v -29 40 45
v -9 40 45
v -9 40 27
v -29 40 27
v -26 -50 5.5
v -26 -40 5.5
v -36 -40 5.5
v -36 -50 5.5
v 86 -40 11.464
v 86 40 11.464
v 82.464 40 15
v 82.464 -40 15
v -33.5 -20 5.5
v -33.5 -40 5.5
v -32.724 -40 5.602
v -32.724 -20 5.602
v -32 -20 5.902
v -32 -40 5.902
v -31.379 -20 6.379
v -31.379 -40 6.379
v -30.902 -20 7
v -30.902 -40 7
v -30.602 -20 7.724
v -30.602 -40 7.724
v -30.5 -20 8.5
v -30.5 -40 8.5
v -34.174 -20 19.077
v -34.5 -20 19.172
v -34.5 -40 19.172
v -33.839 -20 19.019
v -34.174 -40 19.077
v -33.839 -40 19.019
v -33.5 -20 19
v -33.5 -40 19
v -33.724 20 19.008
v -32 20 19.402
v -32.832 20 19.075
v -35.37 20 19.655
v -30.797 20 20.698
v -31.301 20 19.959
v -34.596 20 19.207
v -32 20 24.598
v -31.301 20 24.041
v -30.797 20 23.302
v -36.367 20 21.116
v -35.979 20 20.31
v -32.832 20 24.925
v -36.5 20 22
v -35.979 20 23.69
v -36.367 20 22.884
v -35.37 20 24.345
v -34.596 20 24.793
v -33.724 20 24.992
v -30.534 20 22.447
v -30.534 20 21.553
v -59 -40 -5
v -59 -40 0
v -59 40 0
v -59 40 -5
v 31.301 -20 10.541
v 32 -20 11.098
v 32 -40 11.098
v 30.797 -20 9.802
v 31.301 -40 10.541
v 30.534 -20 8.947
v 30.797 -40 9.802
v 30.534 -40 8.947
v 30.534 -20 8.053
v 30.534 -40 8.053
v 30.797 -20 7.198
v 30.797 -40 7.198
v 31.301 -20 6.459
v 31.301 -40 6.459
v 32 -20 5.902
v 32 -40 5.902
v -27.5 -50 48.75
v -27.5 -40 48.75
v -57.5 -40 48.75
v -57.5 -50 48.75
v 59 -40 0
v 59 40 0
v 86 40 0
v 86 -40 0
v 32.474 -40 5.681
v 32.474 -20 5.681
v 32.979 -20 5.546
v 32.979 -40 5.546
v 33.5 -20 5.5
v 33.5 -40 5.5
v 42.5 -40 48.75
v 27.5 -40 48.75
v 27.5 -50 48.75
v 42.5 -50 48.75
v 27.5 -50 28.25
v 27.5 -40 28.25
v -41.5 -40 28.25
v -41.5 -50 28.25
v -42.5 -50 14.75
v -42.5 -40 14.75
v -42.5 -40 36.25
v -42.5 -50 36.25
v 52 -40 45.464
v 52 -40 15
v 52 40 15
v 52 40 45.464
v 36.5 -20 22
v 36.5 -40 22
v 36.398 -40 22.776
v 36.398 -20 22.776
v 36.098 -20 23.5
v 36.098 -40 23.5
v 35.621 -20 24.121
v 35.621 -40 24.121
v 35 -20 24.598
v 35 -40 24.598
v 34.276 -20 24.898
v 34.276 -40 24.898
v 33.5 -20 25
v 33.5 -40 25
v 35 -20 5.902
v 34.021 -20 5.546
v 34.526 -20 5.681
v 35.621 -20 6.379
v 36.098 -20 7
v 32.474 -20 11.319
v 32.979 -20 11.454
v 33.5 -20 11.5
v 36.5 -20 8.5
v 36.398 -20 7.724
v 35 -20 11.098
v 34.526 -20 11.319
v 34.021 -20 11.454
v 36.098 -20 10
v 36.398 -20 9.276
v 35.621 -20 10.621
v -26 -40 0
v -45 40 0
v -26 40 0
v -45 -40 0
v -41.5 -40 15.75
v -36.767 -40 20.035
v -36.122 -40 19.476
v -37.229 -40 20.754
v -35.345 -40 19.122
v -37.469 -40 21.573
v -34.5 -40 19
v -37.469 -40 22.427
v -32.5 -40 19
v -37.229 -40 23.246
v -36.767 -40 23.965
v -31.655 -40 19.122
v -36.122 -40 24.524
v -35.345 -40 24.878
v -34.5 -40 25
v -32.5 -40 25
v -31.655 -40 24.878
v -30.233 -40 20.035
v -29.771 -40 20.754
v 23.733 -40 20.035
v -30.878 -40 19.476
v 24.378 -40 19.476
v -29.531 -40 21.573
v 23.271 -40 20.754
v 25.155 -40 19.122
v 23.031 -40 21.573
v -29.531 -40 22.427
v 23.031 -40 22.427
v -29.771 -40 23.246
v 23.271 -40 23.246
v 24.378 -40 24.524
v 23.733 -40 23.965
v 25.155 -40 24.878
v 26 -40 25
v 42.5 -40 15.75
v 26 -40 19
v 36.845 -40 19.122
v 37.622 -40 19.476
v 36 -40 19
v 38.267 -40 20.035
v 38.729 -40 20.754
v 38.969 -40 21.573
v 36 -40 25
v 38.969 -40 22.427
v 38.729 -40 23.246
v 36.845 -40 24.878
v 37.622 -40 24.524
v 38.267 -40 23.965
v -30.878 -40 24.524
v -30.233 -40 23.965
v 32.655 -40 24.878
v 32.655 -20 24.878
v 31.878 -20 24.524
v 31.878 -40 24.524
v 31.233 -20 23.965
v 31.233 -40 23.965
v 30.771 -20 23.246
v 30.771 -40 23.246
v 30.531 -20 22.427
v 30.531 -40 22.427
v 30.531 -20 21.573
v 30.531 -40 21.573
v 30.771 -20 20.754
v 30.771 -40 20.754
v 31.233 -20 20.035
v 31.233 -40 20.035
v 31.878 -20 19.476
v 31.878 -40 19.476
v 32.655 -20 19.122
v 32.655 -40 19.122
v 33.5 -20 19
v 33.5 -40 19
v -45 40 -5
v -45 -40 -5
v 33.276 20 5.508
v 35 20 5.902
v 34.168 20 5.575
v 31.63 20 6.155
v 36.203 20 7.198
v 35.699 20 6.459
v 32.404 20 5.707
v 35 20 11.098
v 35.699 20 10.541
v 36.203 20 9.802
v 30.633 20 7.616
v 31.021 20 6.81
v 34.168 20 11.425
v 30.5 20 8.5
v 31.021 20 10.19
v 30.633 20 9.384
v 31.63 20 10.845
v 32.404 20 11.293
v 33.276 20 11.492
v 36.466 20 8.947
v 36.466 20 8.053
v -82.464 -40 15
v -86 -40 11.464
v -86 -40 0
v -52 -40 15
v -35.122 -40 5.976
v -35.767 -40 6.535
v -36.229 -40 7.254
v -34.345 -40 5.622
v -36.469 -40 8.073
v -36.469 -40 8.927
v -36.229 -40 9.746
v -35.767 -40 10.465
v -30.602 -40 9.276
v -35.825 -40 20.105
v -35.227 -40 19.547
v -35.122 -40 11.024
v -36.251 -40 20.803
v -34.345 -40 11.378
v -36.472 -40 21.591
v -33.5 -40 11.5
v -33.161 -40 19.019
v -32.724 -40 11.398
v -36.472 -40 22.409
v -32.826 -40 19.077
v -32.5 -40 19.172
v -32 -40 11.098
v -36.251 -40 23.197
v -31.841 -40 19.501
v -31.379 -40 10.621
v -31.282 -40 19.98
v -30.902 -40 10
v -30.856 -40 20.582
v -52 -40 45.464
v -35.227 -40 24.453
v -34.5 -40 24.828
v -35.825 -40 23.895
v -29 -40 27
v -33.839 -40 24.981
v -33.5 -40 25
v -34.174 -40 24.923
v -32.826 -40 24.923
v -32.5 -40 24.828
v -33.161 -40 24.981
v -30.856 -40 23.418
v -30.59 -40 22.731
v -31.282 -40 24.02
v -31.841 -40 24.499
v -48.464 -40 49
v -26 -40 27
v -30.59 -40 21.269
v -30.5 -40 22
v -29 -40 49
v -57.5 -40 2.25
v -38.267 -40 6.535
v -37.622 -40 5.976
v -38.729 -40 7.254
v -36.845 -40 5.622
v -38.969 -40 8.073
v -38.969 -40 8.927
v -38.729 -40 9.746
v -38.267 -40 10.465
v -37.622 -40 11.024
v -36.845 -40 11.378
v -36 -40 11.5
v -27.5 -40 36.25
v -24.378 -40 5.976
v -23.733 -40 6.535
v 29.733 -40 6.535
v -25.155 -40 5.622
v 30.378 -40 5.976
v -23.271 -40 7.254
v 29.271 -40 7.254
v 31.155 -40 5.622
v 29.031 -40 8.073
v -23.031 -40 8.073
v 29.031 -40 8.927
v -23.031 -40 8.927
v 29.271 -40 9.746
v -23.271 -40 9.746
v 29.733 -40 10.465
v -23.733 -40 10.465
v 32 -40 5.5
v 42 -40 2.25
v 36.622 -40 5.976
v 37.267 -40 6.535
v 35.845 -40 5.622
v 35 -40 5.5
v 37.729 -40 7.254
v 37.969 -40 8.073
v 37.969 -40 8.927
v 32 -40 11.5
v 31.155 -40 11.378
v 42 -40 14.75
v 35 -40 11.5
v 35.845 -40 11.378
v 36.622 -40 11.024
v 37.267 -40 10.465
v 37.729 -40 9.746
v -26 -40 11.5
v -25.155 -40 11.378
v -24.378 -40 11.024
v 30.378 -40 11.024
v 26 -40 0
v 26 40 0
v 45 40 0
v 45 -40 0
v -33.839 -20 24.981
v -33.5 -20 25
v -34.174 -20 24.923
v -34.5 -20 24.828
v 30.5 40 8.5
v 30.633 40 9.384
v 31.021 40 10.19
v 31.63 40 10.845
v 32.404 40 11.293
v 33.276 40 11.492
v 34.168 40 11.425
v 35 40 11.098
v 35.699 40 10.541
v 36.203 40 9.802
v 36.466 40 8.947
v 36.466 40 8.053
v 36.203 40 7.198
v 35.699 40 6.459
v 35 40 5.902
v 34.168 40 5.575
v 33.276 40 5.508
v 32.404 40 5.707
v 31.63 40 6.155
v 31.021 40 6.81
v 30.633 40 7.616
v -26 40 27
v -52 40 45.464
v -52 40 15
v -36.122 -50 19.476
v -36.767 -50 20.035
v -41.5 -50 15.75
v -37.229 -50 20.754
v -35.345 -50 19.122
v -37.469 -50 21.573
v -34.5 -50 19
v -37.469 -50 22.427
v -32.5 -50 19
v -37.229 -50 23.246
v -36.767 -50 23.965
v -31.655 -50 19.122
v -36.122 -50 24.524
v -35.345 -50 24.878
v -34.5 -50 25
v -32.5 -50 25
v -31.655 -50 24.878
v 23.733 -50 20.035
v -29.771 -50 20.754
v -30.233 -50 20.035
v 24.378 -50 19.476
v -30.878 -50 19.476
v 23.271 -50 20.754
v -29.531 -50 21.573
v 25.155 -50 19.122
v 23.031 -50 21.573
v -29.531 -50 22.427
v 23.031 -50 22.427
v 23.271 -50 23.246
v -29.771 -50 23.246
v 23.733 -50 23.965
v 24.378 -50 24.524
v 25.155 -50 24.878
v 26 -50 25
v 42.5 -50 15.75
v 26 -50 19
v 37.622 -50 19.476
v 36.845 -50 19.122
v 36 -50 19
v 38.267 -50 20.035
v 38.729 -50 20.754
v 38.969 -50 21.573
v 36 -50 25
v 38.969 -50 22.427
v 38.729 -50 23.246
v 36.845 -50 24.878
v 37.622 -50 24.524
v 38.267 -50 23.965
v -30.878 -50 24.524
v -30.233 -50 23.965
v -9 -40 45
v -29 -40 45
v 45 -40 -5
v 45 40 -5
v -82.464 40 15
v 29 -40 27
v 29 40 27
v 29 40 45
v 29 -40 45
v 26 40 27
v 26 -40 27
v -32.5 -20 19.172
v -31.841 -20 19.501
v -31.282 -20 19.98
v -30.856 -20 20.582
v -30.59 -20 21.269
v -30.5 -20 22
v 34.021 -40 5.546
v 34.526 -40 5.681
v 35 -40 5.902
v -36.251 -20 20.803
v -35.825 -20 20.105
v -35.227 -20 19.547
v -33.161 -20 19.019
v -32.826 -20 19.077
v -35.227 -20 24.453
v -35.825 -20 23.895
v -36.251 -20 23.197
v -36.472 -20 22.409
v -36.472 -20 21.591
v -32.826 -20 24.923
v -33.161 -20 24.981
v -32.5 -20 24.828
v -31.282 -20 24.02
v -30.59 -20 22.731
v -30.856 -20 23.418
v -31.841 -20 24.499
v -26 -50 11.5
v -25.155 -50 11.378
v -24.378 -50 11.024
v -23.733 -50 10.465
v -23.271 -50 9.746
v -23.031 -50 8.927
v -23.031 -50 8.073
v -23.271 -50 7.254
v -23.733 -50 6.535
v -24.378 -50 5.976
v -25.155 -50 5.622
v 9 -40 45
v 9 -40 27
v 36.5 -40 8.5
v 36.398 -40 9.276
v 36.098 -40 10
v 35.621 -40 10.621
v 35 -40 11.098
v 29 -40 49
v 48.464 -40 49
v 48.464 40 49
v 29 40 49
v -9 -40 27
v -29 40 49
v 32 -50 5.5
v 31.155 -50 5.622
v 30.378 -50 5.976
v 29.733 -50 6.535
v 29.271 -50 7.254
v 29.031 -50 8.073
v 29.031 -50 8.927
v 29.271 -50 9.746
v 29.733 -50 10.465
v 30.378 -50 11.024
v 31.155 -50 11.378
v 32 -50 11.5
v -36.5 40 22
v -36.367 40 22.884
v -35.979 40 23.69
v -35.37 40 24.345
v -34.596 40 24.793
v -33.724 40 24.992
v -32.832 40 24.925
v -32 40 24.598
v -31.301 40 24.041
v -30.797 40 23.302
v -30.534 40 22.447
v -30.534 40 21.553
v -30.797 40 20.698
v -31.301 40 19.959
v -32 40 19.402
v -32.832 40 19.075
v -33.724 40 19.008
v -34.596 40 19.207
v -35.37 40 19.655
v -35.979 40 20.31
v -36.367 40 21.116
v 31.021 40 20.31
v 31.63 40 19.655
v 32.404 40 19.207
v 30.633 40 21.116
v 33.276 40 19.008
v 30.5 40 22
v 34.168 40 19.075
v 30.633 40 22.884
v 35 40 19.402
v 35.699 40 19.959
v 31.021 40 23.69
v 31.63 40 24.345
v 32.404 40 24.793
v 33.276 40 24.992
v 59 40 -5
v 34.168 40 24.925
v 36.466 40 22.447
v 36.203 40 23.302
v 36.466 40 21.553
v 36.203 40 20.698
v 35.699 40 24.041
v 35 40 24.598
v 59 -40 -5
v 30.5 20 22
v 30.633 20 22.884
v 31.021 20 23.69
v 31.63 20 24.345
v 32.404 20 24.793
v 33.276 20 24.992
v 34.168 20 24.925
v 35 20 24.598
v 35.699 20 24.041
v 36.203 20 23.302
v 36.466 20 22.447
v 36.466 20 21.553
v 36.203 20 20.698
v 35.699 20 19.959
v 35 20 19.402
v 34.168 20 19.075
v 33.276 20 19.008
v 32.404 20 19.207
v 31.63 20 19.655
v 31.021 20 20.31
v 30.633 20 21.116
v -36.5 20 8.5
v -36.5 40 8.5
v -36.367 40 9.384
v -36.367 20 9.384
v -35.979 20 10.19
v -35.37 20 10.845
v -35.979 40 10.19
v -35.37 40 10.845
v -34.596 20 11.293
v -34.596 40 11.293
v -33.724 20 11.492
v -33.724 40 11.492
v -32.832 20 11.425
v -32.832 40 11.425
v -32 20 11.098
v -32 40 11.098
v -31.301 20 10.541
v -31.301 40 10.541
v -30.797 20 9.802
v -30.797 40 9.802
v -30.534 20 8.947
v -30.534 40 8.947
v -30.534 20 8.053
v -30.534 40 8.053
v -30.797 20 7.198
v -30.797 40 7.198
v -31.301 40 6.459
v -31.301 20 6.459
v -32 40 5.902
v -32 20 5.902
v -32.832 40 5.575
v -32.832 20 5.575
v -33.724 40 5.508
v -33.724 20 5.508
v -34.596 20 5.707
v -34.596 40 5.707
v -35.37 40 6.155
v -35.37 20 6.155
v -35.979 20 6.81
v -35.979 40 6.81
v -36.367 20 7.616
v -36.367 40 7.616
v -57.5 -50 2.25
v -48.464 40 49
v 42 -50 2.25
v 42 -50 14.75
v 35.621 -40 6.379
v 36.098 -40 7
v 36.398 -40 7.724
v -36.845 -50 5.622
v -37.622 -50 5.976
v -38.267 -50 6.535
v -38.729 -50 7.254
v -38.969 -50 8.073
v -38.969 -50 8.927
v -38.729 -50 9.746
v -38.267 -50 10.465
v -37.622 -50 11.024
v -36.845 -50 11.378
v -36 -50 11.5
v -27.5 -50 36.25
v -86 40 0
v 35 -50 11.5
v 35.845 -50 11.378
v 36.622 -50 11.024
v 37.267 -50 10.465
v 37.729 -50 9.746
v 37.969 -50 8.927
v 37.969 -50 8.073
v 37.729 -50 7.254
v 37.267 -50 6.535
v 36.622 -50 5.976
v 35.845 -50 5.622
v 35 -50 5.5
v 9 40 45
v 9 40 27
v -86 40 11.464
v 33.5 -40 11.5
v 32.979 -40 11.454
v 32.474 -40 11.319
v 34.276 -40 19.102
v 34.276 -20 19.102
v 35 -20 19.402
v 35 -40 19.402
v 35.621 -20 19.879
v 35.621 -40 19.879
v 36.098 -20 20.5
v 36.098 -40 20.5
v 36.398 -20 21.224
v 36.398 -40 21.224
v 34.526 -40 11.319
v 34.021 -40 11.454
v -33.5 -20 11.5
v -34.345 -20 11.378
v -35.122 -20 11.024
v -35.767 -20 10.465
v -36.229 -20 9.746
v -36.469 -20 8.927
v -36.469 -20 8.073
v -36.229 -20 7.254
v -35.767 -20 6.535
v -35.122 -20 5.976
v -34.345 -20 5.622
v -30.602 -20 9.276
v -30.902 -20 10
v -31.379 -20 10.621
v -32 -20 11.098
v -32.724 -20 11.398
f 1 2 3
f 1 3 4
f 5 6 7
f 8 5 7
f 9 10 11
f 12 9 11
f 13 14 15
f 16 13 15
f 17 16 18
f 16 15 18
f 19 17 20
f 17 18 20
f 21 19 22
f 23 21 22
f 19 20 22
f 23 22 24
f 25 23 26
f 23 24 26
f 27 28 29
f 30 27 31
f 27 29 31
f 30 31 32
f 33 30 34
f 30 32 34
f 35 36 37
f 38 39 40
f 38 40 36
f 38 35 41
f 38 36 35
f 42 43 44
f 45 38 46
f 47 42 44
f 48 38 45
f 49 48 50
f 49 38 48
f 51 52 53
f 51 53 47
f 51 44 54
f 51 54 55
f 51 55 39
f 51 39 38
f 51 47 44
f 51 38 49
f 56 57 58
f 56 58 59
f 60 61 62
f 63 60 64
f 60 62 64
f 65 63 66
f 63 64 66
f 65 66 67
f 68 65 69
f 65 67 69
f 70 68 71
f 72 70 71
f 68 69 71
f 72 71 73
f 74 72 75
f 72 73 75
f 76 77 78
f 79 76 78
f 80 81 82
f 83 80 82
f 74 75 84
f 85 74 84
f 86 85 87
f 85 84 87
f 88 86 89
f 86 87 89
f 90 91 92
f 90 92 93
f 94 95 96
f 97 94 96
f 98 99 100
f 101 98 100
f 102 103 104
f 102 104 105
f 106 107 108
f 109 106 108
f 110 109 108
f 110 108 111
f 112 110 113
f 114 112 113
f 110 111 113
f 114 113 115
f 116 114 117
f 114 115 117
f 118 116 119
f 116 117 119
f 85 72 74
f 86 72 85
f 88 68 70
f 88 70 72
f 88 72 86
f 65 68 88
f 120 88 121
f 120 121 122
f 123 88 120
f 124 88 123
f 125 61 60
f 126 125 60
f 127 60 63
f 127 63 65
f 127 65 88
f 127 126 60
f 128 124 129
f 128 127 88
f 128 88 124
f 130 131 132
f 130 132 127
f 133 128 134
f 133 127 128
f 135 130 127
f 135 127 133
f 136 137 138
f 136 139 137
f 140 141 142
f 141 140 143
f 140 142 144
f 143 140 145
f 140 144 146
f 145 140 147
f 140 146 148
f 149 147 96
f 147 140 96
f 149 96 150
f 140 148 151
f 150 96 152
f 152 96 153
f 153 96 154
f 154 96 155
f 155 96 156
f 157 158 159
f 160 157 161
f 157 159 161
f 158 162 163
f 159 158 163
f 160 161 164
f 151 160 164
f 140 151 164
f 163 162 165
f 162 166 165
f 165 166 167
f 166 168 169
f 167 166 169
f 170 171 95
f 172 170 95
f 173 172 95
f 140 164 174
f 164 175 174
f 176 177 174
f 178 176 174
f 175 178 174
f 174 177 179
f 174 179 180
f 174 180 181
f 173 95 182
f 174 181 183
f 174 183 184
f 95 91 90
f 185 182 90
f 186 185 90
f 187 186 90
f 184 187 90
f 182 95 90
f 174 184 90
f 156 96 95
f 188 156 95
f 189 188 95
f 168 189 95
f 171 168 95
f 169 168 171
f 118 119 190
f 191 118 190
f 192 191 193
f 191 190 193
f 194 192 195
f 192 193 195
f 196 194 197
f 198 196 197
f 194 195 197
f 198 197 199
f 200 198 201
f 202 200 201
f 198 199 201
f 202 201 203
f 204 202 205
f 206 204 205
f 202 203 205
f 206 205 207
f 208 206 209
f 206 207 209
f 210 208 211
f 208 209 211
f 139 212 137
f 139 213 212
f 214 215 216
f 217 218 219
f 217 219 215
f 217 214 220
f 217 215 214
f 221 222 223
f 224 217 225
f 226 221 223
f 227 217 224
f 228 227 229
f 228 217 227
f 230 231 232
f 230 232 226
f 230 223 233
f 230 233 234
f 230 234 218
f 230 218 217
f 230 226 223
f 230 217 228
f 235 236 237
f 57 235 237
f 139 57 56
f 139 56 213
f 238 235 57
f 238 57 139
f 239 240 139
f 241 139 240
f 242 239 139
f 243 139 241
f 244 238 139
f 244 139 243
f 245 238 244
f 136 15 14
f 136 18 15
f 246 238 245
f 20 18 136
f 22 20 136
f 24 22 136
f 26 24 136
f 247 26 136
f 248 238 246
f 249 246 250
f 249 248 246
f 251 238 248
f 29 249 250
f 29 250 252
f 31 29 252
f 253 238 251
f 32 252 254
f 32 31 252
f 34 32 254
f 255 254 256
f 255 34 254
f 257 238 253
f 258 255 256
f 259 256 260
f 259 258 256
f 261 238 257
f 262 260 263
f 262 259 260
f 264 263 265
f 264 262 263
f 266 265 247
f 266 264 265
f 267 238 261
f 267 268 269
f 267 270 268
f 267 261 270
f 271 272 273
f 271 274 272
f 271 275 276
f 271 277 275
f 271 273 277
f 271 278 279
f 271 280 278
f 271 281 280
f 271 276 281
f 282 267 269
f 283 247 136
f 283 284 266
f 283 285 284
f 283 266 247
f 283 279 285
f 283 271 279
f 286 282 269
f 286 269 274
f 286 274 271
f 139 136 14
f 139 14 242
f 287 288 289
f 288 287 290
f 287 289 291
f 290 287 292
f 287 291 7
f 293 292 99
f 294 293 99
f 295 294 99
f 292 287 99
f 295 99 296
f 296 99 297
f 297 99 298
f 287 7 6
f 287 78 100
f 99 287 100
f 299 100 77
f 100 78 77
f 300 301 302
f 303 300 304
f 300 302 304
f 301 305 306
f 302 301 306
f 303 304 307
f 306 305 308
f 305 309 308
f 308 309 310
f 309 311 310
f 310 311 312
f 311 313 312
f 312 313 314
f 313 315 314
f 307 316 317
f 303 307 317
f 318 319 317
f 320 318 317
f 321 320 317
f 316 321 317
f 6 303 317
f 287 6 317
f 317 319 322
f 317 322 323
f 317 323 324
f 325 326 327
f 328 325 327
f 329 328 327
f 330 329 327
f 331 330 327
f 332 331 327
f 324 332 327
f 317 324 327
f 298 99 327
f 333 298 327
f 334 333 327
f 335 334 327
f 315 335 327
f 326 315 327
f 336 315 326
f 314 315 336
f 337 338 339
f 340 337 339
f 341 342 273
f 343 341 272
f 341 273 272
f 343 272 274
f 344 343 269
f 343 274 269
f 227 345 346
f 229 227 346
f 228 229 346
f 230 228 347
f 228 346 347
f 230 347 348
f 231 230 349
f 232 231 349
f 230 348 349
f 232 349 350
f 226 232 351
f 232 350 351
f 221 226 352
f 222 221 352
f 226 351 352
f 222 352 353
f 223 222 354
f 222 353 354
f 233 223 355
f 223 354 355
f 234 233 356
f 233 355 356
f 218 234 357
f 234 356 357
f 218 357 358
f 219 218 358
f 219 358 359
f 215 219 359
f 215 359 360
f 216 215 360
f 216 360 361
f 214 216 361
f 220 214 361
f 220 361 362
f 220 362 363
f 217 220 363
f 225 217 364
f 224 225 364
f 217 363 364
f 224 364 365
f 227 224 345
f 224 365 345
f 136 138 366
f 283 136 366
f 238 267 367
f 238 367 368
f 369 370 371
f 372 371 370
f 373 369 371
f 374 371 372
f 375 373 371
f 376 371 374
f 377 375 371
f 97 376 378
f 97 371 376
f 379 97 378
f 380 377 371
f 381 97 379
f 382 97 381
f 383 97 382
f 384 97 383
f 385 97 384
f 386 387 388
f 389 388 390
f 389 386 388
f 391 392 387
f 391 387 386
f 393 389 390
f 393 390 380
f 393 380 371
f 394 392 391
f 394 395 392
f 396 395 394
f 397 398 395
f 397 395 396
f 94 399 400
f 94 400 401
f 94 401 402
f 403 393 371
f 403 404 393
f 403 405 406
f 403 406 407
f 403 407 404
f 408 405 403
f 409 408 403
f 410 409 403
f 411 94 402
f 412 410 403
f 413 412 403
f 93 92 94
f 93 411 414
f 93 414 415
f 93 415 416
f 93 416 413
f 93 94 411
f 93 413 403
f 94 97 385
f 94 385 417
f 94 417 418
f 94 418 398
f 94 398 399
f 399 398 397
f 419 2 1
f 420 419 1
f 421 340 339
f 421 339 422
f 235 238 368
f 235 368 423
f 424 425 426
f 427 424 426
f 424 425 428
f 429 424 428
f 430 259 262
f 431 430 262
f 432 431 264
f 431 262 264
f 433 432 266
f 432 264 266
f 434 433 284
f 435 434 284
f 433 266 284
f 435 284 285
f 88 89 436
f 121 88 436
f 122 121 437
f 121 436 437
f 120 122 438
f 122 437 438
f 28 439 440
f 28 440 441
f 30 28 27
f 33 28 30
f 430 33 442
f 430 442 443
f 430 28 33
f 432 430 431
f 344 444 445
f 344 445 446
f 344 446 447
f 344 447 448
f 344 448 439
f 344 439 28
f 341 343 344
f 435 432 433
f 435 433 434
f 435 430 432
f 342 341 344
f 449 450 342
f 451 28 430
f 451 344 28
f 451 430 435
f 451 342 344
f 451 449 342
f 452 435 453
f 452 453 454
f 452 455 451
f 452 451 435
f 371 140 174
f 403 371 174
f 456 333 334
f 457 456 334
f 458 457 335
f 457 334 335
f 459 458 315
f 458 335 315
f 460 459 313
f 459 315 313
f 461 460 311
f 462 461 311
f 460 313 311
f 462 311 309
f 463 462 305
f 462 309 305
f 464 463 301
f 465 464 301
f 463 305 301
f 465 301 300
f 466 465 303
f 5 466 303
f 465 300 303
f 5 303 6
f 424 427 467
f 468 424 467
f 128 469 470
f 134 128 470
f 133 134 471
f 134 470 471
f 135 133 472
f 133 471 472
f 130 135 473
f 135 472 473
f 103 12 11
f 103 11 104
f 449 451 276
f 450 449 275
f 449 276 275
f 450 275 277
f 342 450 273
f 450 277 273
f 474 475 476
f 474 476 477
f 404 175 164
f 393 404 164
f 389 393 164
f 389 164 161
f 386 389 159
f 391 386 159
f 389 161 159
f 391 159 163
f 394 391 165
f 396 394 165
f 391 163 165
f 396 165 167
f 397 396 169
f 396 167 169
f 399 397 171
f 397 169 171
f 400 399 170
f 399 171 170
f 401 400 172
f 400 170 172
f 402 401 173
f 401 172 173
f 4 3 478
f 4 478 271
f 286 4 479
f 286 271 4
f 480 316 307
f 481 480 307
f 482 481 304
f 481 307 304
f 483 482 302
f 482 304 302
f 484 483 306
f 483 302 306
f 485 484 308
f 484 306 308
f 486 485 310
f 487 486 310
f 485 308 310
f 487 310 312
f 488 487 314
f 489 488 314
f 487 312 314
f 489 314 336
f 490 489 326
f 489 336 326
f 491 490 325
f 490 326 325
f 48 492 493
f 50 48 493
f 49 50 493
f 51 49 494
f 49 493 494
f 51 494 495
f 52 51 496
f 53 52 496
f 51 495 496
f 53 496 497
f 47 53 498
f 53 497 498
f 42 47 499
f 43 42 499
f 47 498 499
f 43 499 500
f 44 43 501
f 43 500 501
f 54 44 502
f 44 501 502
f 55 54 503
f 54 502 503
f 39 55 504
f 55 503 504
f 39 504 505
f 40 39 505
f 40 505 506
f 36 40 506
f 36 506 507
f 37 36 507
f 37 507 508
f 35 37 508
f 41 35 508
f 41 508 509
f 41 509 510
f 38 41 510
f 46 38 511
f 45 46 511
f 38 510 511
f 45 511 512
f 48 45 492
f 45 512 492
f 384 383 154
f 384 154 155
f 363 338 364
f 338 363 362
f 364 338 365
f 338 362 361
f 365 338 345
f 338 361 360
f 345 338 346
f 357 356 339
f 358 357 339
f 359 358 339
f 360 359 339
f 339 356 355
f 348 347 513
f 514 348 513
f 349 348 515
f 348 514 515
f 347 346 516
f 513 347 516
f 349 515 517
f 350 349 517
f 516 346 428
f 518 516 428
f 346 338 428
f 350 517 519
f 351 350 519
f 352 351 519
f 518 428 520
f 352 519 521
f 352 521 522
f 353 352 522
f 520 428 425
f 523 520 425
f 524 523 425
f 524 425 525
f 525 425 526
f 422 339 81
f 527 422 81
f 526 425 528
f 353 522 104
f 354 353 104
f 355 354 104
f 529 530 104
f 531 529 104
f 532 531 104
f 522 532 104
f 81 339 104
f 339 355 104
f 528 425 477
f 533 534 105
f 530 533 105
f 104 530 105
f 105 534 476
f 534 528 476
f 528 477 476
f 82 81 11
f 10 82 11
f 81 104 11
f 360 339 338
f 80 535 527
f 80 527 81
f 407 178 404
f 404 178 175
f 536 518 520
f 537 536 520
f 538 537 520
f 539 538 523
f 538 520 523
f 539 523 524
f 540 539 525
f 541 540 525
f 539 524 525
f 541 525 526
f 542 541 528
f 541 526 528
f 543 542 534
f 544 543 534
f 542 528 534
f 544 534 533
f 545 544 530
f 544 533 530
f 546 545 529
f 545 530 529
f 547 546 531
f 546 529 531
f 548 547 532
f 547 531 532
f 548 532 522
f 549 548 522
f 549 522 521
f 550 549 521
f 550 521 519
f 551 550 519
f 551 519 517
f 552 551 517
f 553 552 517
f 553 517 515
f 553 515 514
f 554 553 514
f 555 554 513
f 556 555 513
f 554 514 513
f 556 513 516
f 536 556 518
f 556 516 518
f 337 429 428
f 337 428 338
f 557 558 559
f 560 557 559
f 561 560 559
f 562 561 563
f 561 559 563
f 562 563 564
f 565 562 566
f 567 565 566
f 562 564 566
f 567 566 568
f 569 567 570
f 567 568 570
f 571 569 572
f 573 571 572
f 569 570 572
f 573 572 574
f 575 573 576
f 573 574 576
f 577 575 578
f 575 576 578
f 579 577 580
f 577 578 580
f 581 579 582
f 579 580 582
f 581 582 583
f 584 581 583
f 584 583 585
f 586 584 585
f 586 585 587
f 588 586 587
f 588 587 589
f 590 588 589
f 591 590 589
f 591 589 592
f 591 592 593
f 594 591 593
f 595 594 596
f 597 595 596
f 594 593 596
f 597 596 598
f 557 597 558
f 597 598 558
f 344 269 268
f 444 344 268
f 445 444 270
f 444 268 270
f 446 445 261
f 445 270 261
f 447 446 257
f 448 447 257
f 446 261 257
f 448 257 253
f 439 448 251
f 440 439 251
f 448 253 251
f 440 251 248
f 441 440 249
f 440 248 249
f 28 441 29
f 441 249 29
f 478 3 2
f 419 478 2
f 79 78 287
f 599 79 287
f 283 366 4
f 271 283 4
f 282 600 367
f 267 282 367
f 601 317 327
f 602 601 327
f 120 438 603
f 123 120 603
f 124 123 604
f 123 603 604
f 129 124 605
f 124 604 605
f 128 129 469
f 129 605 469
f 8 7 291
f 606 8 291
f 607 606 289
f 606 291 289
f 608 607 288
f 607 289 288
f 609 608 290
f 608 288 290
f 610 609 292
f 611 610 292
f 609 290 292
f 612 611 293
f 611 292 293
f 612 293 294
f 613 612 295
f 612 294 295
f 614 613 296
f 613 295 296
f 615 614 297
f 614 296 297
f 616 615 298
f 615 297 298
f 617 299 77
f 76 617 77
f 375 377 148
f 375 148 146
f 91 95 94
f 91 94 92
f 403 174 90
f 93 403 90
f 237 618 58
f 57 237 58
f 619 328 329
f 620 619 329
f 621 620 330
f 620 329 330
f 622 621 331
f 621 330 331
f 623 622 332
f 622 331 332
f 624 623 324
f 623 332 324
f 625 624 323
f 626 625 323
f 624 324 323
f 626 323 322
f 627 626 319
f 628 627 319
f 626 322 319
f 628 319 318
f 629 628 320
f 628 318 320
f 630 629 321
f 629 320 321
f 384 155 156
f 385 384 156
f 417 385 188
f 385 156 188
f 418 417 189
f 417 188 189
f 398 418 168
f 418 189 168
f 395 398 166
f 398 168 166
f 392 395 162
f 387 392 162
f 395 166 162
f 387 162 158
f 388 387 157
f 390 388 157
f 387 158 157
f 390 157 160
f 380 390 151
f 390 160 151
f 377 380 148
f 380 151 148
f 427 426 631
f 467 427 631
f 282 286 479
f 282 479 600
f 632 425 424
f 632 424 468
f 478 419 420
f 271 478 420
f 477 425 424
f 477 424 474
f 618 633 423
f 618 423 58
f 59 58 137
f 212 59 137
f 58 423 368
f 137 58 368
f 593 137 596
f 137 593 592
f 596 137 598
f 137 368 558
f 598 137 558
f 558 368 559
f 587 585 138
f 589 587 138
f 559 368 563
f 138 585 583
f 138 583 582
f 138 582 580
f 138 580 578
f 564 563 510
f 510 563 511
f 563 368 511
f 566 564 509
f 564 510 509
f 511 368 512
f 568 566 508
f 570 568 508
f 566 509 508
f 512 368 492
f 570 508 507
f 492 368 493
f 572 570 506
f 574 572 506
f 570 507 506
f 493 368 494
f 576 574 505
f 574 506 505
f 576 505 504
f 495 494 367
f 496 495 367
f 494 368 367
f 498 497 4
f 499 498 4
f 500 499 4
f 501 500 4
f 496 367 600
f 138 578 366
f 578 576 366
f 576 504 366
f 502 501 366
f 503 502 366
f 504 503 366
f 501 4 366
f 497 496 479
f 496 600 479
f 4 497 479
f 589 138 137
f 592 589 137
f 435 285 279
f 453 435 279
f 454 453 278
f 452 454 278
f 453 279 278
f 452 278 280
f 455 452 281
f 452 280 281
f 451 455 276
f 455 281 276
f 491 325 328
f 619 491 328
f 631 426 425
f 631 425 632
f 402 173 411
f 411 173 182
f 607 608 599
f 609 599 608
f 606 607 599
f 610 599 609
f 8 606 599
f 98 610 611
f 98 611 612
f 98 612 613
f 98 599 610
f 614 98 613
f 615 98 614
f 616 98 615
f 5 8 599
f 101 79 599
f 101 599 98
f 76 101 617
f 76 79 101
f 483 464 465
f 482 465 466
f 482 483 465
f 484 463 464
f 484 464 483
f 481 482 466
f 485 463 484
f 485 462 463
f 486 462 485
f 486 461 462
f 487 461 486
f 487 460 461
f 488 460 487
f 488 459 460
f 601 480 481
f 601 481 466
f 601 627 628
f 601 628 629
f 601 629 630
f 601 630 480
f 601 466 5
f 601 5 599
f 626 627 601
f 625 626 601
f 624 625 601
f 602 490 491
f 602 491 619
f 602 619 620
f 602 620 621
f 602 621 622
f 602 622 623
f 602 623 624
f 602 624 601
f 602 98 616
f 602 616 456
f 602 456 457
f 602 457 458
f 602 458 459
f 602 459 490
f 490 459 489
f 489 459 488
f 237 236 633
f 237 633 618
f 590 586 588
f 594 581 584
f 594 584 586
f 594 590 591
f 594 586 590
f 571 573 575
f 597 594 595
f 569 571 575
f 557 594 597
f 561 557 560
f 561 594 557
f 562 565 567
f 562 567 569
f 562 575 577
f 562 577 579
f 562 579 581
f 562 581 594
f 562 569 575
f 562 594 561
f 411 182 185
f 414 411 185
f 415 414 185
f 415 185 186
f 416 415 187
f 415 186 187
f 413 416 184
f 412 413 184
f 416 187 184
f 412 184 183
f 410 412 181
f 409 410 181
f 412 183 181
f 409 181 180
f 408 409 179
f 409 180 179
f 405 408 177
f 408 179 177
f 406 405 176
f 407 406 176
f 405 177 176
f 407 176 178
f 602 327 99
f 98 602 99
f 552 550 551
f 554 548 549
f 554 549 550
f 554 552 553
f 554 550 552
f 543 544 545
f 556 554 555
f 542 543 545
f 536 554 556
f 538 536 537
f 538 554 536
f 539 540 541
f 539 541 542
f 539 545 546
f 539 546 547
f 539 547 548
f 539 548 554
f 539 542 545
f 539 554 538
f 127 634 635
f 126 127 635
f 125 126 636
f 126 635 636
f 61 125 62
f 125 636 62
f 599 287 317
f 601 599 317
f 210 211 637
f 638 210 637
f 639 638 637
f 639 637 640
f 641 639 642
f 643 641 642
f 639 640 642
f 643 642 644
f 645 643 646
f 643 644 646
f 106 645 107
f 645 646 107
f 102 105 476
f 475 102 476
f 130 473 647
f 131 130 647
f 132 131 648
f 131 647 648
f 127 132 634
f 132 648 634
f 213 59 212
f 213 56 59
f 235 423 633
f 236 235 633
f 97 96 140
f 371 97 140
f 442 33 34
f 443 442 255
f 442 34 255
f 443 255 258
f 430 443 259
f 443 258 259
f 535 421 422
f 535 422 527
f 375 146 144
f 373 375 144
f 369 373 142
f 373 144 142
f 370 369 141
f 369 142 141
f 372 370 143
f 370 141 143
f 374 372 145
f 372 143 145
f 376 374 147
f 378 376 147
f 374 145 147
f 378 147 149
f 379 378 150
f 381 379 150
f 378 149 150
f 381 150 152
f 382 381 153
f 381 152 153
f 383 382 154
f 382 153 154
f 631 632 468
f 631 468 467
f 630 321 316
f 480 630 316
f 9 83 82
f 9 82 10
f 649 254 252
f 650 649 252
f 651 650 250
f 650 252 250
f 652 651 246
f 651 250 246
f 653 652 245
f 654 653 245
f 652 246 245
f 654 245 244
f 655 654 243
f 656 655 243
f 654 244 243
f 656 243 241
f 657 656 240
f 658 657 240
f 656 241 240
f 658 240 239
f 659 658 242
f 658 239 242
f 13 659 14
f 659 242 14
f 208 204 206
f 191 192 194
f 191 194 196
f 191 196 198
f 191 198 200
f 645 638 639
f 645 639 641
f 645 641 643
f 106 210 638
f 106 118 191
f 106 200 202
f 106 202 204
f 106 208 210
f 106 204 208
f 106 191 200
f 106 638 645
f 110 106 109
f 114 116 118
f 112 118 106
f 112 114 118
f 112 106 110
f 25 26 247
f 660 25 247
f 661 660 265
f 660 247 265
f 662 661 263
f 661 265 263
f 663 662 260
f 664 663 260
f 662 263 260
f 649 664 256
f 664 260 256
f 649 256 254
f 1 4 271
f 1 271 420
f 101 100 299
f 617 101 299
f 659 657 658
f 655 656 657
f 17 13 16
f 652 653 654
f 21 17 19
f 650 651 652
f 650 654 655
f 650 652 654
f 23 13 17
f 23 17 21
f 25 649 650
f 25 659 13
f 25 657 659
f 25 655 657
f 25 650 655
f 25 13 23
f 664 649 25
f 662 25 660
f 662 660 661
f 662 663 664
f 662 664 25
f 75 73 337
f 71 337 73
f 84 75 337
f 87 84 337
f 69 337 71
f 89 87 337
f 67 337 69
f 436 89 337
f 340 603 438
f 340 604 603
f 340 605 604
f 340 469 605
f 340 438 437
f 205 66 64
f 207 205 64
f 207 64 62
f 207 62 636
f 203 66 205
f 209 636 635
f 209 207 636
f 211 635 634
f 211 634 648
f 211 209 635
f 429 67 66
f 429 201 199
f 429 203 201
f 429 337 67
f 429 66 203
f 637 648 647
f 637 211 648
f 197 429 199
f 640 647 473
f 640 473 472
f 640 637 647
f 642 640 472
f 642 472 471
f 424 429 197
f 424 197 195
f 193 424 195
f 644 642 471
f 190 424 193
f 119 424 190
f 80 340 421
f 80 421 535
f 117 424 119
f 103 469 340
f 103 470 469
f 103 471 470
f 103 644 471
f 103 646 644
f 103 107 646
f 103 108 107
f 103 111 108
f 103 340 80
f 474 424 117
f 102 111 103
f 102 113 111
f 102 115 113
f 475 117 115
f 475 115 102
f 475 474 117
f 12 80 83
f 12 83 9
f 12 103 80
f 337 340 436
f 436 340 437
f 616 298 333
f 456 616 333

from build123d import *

# Parameters (mm, degrees)
F1_DEPTH  = 40
F2_W      = 3
F2_H      = 18
F3_W      = 3
F3_H      = 18
F4_DEPTH  = 80
F5_W      = 15
F5_H      = 20.5
F6_DEPTH  = 10
F7_DEPTH  = 20
F10_DEPTH = 20
F9_W      = 15
F9_H      = 12.5
F11_DEPTH = 10
F12_W     = 20
F12_H     = 18
F13_DEPTH = 80
F14_R     = 3
F15_DEPTH = 20


# Not quite as in the source:
# - a feature names something its author has since deleted; it is built from what else it names


with BuildPart() as f1:
    # F0 (on Front) → F1 (new body, symmetric)
    with BuildSketch(Plane.XZ):
        Polygon((-45, 0), (-26, 0), (-26, 45), (-29, 45), (-29, 49), (-48.4644660941, 49), (-52, 45.4644660941), (-52, 15), (-82.4644660941, 15), (-86, 11.4644660941), (-86, 0), (-59, 0), (-59, -5), (-45, -5), align=None)
    extrude(amount=F1_DEPTH, both=True)


with BuildPart() as f1b:
    # F0 (on Front) → F1, piece 2 (new body, symmetric)
    with BuildSketch(Plane.XZ):
        Polygon((26, 0), (45, 0), (45, -5), (59, -5), (59, 0), (86, 0), (86, 11.4644660941), (82.4644660941, 15), (52, 15), (52, 45.4644660941), (48.4644660941, 49), (29, 49), (29, 45), (26, 45), align=None)
    extrude(amount=F1_DEPTH, both=True)


with BuildPart() as f4_tool:
    # F2 (on face) + F3 (on face) → F4 (new body)
    with BuildSketch(Plane(origin=(0, 40, 0), x_dir=(-1, 0, 0), z_dir=(0, 1, 0))):
        with Locations((-27.5, 36)):
            Rectangle(F2_W, F2_H)
    with BuildSketch(Plane(origin=(0, 40, 0), x_dir=(-1, 0, 0), z_dir=(0, 1, 0))):
        with Locations((27.5, 36)):
            Rectangle(F3_W, F3_H)
    extrude(amount=-F4_DEPTH)


with BuildPart() as f1_1:
    add(f1.part)

    # F4: cut by f4_tool
    add(f4_tool.part, mode=Mode.SUBTRACT)


with BuildPart() as f1b_1:
    add(f1b.part)

    # F4: cut by f4_tool
    add(f4_tool.part, mode=Mode.SUBTRACT)


with BuildPart() as f6:
    # F5 (on face) → F6 (new body)
    with BuildSketch(Plane.XZ.offset(40)):
        Polygon((-41.5, 28.25), (-41.5, 15.75), (42.5, 15.75), (42.5, 28.25), (27.5, 28.25), align=None)
        with BuildLine():
            Line((-34.5, 25), (-33.5, 25))
            Line((-33.5, 25), (-32.5, 25))
            ThreePointArc((-32.5, 25), (-29.5, 22), (-32.5, 19))
            Line((-32.5, 19), (-33.5, 19))
            Line((-33.5, 19), (-34.5, 19))
            ThreePointArc((-34.5, 19), (-37.5, 22), (-34.5, 25))
        make_face(mode=Mode.SUBTRACT)
        with BuildLine():
            Line((25.9999999072, 25), (33.5, 25))
            Line((33.5, 25), (36.0000002221, 25))
            ThreePointArc((36.0000002221, 25), (39.0000002221, 21.9999999354), (36.0000000928, 19))
            Line((36.0000000928, 19), (33.5, 19))
            Line((33.5, 19), (25.9999997779, 19))
            ThreePointArc((25.9999997779, 19), (23.0000002221, 22.0000000646), (25.9999999072, 25))
        make_face(mode=Mode.SUBTRACT)
        with Locations((35, 38.5)):
            Rectangle(F5_W, F5_H)
    extrude(amount=F6_DEPTH)


with BuildPart() as f7_tool:
    # F5 (on face) → F7 (new body)
    with BuildSketch(Plane.XZ.offset(40)):
        with BuildLine():
            ThreePointArc((-32.5, 19.1715728753), (-31.0505102572, 20.2679491924), (-30.5, 22))
            ThreePointArc((-30.5, 22), (-31.0505102572, 23.7320508076), (-32.5, 24.8284271247))
            Line((-32.5, 24.8284271247), (-32.5, 19.1715728753))
        make_face()
        with BuildLine():
            Line((-32.5, 19.1715728753), (-32.5, 24.8284271247))
            ThreePointArc((-32.5, 24.8284271247), (-32.9926940638, 24.956795679), (-33.5, 25))
            ThreePointArc((-33.5, 25), (-34.0073059362, 24.956795679), (-34.5, 24.8284271247))
            Line((-34.5, 24.8284271247), (-34.5, 19.1715728753))
            ThreePointArc((-34.5, 19.1715728753), (-34.0073059362, 19.043204321), (-33.5, 19))
            ThreePointArc((-33.5, 19), (-32.9926940638, 19.043204321), (-32.5, 19.1715728753))
        make_face()
        with BuildLine():
            Line((-34.5, 19.1715728753), (-34.5, 24.8284271247))
            ThreePointArc((-34.5, 24.8284271247), (-36.5, 22), (-34.5, 19.1715728753))
        make_face()
        with BuildLine():
            ThreePointArc((33.5, 19), (35.6213203436, 19.8786796564), (36.5, 22))
            ThreePointArc((36.5, 22), (35.6213203436, 24.1213203436), (33.5, 25))
            ThreePointArc((33.5, 25), (30.5, 22), (33.5, 19))
        make_face()
    extrude(amount=-F7_DEPTH)


with BuildPart() as f1_2:
    add(f1_1.part)

    # F7: cut by f7_tool
    add(f7_tool.part, mode=Mode.SUBTRACT)


with BuildPart() as f1b_2:
    add(f1b_1.part)

    # F7: cut by f7_tool
    add(f7_tool.part, mode=Mode.SUBTRACT)


with BuildPart() as f10_tool:
    # F9 (on face) → F10 (new body)
    with BuildSketch(Plane.XZ.offset(40)):
        with BuildLine():
            ThreePointArc((-33.5, 5.5), (-31.3786796564, 6.3786796564), (-30.5, 8.5))
            ThreePointArc((-30.5, 8.5), (-31.3786796564, 10.6213203436), (-33.5, 11.5))
            ThreePointArc((-33.5, 11.5), (-36.5, 8.5), (-33.5, 5.5))
        make_face()
        with BuildLine():
            Line((32, 5.9019237886), (32, 11.0980762114))
            ThreePointArc((32, 11.0980762114), (30.5, 8.5), (32, 5.9019237886))
        make_face()
        with BuildLine():
            Line((35, 5.9019237886), (35, 11.0980762114))
            ThreePointArc((35, 11.0980762114), (34.2764571353, 11.3977774789), (33.5, 11.5))
            ThreePointArc((33.5, 11.5), (32.7235428647, 11.3977774789), (32, 11.0980762114))
            Line((32, 11.0980762114), (32, 5.9019237886))
            ThreePointArc((32, 5.9019237886), (32.7235428647, 5.6022225211), (33.5, 5.5))
            ThreePointArc((33.5, 5.5), (34.2764571353, 5.6022225211), (35, 5.9019237886))
        make_face()
        with BuildLine():
            ThreePointArc((35, 5.9019237886), (36.0980762114, 7), (36.5, 8.5))
            ThreePointArc((36.5, 8.5), (36.0980762114, 10), (35, 11.0980762114))
            Line((35, 11.0980762114), (35, 5.9019237886))
        make_face()
    extrude(amount=-F10_DEPTH)


with BuildPart() as f1_3:
    add(f1_2.part)

    # F10: cut by f10_tool
    add(f10_tool.part, mode=Mode.SUBTRACT)


with BuildPart() as f1b_3:
    add(f1b_2.part)

    # F10: cut by f10_tool
    add(f10_tool.part, mode=Mode.SUBTRACT)


with BuildPart() as f11:
    # F9 (on face) → F11 (new body)
    with BuildSketch(Plane.XZ.offset(40)):
        Polygon((-57.5, 14.75), (-57.5, 2.25), (42, 2.25), (42, 14.75), (-42.5, 14.75), align=None)
        with BuildLine():
            Line((-36.0000002215, 11.5), (-33.5, 11.5))
            Line((-33.5, 11.5), (-26.0000002215, 11.5))
            ThreePointArc((-26.0000002215, 11.5), (-22.9999997785, 8.5000002215), (-25.9999997785, 5.5))
            Line((-25.9999997785, 5.5), (-33.5, 5.5))
            Line((-33.5, 5.5), (-35.9999997785, 5.5))
            ThreePointArc((-35.9999997785, 5.5), (-38.9999997785, 8.4999997785), (-36.0000002215, 11.5))
        make_face(mode=Mode.SUBTRACT)
        with BuildLine():
            Line((32, 11.5), (33.5, 11.5))
            Line((33.5, 11.5), (35, 11.5))
            ThreePointArc((35, 11.5), (38, 8.5), (35, 5.5))
            Line((35, 5.5), (33.5, 5.5))
            Line((33.5, 5.5), (32, 5.5))
            ThreePointArc((32, 5.5), (29, 8.5), (32, 11.5))
        make_face(mode=Mode.SUBTRACT)
        Polygon((-57.5, 48.75), (-57.5, 14.75), (-42.5, 14.75), (-42.5, 36.25), (-42.5, 48.75), align=None)
        with Locations((-35, 42.5)):
            Rectangle(F9_W, F9_H)
    extrude(amount=F11_DEPTH)


with BuildPart() as f13:
    # F12 (on face) → F13 (new body)
    with BuildSketch(Plane(origin=(0, 40, 0), x_dir=(-1, 0, 0), z_dir=(0, 1, 0))):
        with Locations((-19, 36)):
            Rectangle(F12_W, F12_H)
    extrude(amount=-F13_DEPTH)


with BuildPart() as f13b:
    # F12 (on face) → F13, piece 2 (new body)
    with BuildSketch(Plane(origin=(0, 40, 0), x_dir=(-1, 0, 0), z_dir=(0, 1, 0))):
        with Locations((19, 36)):
            Rectangle(F12_W, F12_H)
    extrude(amount=-F13_DEPTH)


with BuildPart() as f15_tool:
    # F14 (on face) → F15 (new body)
    with BuildSketch(Plane(origin=(0, 40, 0), x_dir=(-1, 0, 0), z_dir=(0, 1, 0))):
        with Locations((-33.5, 22)):
            Circle(F14_R)
        with Locations((-33.5, 8.5)):
            Circle(F14_R)
        with Locations((33.5, 8.5)):
            Circle(F14_R)
        with Locations((33.5, 22)):
            Circle(F14_R)
    extrude(amount=-F15_DEPTH)


with BuildPart() as f1_4:
    add(f1_3.part)

    # F15: cut by f15_tool
    add(f15_tool.part, mode=Mode.SUBTRACT)


with BuildPart() as f1b_4:
    add(f1b_3.part)

    # F15: cut by f15_tool
    add(f15_tool.part, mode=Mode.SUBTRACT)


solid = Compound([f6.part, f11.part, f13.part, f13b.part, f1_4.part, f1b_4.part])
